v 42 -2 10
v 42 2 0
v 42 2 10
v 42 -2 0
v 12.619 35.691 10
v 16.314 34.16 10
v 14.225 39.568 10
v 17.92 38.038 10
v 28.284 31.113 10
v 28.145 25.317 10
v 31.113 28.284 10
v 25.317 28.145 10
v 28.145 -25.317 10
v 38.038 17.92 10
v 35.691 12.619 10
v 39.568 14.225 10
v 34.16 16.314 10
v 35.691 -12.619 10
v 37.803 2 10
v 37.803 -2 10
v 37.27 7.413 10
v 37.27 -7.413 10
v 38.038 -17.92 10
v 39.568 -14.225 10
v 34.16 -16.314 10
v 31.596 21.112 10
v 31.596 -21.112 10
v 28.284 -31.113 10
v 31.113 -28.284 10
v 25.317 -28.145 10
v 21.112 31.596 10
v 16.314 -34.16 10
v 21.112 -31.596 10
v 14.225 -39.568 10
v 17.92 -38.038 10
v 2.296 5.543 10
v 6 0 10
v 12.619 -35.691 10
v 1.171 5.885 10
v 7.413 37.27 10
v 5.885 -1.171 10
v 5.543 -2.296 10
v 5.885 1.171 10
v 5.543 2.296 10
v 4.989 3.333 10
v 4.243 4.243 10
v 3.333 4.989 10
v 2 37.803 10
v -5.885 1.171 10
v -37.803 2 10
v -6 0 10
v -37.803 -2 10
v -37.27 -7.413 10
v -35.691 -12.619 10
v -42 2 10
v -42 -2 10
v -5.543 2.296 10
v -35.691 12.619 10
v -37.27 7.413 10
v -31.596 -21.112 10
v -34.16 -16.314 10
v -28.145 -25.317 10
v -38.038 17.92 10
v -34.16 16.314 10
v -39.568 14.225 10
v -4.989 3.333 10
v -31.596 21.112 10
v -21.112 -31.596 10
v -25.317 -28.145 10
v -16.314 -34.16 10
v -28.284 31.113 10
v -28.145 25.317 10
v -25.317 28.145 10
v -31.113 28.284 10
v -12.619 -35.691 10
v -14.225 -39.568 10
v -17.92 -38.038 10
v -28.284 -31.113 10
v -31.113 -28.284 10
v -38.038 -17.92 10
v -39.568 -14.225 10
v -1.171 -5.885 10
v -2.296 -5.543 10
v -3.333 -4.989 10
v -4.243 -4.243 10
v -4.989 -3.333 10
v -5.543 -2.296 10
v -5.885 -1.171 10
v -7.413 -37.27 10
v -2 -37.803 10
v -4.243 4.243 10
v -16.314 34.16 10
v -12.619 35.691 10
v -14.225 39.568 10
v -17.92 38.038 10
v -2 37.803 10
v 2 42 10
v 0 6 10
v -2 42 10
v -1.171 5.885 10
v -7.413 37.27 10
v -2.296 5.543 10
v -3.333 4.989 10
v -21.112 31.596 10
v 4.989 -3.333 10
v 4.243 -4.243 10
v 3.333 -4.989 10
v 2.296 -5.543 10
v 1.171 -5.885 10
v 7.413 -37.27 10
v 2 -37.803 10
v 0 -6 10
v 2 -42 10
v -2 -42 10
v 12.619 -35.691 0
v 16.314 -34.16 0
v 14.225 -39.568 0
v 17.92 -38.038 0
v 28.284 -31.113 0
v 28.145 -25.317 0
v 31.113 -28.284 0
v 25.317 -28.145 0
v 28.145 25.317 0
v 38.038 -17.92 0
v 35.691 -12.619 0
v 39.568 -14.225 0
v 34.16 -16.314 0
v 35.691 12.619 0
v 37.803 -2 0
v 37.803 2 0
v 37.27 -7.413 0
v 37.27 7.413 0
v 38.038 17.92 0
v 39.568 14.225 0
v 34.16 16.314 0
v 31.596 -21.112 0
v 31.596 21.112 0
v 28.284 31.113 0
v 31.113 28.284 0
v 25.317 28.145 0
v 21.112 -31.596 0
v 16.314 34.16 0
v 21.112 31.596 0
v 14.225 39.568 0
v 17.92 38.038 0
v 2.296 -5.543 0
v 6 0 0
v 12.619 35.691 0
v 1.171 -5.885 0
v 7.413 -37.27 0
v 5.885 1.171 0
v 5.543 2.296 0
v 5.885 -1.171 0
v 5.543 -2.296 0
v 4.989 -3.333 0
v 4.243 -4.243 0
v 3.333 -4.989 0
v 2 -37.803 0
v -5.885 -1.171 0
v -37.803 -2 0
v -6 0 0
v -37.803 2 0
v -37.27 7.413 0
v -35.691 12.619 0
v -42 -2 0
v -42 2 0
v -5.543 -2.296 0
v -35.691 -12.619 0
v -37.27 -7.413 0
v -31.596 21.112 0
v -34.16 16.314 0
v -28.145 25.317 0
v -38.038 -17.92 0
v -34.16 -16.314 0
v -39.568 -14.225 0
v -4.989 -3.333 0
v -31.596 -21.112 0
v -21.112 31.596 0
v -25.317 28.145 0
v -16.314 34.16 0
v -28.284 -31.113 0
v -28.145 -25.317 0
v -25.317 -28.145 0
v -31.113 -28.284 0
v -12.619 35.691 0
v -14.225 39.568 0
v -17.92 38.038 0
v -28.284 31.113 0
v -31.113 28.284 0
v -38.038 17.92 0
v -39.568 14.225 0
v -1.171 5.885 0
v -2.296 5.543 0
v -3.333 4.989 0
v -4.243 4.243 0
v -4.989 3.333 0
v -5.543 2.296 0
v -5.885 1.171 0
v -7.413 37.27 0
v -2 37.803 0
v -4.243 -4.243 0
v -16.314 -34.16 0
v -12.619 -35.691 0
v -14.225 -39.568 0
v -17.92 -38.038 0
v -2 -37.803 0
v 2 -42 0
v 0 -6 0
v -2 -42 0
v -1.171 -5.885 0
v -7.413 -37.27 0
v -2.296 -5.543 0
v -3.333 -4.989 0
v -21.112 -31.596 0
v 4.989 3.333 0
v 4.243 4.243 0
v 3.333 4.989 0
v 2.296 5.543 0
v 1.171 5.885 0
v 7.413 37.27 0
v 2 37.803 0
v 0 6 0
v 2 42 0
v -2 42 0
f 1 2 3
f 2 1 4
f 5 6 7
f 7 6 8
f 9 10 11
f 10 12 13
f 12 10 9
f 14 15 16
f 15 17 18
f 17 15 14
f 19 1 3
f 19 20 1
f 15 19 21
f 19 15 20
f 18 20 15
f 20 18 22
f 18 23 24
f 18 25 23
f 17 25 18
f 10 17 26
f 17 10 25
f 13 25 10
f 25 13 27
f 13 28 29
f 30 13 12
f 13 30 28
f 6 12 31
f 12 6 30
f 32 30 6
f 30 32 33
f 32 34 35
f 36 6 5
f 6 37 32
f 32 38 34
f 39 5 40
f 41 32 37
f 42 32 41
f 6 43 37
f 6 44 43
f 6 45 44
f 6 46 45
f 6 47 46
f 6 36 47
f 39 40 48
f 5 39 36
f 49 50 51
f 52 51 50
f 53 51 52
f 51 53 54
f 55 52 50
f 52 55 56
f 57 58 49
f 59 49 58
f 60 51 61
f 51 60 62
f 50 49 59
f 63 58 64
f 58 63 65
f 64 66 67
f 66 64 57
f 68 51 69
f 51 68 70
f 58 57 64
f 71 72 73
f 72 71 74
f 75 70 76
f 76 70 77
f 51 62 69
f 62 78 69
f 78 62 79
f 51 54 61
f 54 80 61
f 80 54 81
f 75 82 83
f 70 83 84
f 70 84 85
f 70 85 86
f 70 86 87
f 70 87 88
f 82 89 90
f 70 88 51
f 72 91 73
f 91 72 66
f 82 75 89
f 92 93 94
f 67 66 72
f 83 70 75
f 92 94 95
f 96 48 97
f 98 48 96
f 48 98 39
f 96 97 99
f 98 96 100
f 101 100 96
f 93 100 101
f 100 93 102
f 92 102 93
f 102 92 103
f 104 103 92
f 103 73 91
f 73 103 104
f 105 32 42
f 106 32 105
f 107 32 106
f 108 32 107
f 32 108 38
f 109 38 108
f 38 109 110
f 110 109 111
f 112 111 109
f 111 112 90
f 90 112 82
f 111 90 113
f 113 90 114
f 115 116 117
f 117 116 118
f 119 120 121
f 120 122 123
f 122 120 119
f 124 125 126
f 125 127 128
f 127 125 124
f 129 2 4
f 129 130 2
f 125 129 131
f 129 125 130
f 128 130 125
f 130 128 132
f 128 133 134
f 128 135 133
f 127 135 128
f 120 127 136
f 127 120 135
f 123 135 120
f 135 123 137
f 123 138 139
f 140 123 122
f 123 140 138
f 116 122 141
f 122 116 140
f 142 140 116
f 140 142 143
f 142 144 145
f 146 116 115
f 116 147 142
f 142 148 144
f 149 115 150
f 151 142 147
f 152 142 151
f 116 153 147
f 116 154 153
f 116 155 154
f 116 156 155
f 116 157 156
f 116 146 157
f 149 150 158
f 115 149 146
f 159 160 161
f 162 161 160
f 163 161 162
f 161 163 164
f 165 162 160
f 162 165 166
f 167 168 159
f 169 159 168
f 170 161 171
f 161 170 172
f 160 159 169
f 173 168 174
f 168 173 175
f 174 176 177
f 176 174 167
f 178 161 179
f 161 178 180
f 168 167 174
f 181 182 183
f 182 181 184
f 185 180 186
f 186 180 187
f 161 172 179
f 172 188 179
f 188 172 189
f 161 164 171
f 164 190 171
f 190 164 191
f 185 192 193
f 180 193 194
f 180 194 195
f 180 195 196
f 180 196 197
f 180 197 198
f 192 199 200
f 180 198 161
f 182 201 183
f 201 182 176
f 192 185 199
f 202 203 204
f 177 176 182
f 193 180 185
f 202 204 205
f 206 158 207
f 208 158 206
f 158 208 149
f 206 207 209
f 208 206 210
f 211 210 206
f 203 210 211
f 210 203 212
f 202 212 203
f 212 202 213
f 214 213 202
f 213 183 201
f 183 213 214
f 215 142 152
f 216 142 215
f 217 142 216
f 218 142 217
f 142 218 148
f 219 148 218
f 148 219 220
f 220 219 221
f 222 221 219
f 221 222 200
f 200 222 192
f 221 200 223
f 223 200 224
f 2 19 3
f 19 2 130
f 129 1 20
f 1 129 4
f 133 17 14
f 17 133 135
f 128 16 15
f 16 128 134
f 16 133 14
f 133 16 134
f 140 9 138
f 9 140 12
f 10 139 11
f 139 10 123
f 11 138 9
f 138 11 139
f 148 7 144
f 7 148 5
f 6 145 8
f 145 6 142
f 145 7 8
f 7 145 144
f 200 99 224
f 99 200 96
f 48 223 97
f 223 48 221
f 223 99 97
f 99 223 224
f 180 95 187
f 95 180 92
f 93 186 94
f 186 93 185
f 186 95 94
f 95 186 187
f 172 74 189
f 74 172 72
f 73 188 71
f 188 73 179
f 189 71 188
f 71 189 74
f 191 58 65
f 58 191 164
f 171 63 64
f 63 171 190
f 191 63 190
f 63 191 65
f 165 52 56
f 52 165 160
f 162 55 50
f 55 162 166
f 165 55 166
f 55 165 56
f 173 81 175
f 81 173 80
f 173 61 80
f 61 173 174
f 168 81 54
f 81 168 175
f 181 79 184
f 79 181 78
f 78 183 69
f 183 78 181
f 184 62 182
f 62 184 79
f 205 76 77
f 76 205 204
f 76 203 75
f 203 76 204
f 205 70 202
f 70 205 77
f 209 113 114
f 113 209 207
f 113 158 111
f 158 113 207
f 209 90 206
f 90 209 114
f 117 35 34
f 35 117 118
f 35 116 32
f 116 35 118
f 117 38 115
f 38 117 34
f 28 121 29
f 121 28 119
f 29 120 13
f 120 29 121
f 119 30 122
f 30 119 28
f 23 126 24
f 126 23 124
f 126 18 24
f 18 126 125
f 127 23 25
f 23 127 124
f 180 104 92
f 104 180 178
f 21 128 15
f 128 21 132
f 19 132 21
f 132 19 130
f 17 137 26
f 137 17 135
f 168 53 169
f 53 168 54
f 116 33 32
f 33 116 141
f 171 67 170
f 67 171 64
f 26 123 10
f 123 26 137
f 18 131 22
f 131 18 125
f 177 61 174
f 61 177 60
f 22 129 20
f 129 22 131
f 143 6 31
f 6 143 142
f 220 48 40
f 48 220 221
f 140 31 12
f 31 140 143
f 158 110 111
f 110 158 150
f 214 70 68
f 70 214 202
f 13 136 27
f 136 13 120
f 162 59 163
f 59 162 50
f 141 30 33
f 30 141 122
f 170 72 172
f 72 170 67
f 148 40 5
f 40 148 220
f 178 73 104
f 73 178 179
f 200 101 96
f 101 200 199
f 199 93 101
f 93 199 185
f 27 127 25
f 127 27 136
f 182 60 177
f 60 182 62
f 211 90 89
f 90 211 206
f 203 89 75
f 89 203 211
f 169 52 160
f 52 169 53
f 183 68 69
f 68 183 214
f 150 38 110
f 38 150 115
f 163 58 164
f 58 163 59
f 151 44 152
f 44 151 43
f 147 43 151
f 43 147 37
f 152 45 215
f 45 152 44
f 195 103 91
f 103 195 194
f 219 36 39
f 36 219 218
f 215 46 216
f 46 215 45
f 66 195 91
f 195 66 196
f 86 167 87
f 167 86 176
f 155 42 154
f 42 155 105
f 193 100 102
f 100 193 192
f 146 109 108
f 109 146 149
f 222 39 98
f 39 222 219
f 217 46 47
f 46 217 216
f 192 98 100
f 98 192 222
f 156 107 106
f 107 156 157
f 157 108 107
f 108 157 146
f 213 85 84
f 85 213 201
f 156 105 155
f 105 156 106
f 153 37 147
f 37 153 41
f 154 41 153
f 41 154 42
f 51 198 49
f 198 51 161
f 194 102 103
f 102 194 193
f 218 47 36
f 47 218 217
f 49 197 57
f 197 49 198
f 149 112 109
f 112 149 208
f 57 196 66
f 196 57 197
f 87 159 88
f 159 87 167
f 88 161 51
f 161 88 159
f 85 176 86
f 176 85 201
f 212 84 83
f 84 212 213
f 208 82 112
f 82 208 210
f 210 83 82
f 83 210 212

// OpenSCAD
$fn = 32;

// ----------------------------------------------------------------------
// Spur blank: bored gear blank
// ----------------------------------------------------------------------

// --- parameters (mm) ---
disc_r = 38;              // blank root radius
disc_t = 10;              // blank thickness
n_teeth = 16;             // stub tooth count
tooth_w = 4;              // tooth width at the root
tooth_h = 4;              // tooth height above the root
bore_r = 6;               // central bore radius
fit_tol = 0.1;            // tolerance for press fits, mm
free_tol = 0.5;           // tolerance for clearance fits, mm

out_r = disc_r + tooth_h;  // tip radius
bbox_x = 84.0;  // measured width over the teeth
bbox_y = 84.0;  // measured depth over the teeth

difference() {
union() {
  cylinder(r = disc_r, h = disc_t);
  for (i = [0 : n_teeth - 1])
    rotate([0, 0, i * 360 / n_teeth])
      translate([disc_r - 1, -tooth_w / 2, 0])
        cube([tooth_h + 1, tooth_w, disc_t]);
}
  translate([0, 0, -1]) cylinder(r = bore_r, h = disc_t + 2);
}
